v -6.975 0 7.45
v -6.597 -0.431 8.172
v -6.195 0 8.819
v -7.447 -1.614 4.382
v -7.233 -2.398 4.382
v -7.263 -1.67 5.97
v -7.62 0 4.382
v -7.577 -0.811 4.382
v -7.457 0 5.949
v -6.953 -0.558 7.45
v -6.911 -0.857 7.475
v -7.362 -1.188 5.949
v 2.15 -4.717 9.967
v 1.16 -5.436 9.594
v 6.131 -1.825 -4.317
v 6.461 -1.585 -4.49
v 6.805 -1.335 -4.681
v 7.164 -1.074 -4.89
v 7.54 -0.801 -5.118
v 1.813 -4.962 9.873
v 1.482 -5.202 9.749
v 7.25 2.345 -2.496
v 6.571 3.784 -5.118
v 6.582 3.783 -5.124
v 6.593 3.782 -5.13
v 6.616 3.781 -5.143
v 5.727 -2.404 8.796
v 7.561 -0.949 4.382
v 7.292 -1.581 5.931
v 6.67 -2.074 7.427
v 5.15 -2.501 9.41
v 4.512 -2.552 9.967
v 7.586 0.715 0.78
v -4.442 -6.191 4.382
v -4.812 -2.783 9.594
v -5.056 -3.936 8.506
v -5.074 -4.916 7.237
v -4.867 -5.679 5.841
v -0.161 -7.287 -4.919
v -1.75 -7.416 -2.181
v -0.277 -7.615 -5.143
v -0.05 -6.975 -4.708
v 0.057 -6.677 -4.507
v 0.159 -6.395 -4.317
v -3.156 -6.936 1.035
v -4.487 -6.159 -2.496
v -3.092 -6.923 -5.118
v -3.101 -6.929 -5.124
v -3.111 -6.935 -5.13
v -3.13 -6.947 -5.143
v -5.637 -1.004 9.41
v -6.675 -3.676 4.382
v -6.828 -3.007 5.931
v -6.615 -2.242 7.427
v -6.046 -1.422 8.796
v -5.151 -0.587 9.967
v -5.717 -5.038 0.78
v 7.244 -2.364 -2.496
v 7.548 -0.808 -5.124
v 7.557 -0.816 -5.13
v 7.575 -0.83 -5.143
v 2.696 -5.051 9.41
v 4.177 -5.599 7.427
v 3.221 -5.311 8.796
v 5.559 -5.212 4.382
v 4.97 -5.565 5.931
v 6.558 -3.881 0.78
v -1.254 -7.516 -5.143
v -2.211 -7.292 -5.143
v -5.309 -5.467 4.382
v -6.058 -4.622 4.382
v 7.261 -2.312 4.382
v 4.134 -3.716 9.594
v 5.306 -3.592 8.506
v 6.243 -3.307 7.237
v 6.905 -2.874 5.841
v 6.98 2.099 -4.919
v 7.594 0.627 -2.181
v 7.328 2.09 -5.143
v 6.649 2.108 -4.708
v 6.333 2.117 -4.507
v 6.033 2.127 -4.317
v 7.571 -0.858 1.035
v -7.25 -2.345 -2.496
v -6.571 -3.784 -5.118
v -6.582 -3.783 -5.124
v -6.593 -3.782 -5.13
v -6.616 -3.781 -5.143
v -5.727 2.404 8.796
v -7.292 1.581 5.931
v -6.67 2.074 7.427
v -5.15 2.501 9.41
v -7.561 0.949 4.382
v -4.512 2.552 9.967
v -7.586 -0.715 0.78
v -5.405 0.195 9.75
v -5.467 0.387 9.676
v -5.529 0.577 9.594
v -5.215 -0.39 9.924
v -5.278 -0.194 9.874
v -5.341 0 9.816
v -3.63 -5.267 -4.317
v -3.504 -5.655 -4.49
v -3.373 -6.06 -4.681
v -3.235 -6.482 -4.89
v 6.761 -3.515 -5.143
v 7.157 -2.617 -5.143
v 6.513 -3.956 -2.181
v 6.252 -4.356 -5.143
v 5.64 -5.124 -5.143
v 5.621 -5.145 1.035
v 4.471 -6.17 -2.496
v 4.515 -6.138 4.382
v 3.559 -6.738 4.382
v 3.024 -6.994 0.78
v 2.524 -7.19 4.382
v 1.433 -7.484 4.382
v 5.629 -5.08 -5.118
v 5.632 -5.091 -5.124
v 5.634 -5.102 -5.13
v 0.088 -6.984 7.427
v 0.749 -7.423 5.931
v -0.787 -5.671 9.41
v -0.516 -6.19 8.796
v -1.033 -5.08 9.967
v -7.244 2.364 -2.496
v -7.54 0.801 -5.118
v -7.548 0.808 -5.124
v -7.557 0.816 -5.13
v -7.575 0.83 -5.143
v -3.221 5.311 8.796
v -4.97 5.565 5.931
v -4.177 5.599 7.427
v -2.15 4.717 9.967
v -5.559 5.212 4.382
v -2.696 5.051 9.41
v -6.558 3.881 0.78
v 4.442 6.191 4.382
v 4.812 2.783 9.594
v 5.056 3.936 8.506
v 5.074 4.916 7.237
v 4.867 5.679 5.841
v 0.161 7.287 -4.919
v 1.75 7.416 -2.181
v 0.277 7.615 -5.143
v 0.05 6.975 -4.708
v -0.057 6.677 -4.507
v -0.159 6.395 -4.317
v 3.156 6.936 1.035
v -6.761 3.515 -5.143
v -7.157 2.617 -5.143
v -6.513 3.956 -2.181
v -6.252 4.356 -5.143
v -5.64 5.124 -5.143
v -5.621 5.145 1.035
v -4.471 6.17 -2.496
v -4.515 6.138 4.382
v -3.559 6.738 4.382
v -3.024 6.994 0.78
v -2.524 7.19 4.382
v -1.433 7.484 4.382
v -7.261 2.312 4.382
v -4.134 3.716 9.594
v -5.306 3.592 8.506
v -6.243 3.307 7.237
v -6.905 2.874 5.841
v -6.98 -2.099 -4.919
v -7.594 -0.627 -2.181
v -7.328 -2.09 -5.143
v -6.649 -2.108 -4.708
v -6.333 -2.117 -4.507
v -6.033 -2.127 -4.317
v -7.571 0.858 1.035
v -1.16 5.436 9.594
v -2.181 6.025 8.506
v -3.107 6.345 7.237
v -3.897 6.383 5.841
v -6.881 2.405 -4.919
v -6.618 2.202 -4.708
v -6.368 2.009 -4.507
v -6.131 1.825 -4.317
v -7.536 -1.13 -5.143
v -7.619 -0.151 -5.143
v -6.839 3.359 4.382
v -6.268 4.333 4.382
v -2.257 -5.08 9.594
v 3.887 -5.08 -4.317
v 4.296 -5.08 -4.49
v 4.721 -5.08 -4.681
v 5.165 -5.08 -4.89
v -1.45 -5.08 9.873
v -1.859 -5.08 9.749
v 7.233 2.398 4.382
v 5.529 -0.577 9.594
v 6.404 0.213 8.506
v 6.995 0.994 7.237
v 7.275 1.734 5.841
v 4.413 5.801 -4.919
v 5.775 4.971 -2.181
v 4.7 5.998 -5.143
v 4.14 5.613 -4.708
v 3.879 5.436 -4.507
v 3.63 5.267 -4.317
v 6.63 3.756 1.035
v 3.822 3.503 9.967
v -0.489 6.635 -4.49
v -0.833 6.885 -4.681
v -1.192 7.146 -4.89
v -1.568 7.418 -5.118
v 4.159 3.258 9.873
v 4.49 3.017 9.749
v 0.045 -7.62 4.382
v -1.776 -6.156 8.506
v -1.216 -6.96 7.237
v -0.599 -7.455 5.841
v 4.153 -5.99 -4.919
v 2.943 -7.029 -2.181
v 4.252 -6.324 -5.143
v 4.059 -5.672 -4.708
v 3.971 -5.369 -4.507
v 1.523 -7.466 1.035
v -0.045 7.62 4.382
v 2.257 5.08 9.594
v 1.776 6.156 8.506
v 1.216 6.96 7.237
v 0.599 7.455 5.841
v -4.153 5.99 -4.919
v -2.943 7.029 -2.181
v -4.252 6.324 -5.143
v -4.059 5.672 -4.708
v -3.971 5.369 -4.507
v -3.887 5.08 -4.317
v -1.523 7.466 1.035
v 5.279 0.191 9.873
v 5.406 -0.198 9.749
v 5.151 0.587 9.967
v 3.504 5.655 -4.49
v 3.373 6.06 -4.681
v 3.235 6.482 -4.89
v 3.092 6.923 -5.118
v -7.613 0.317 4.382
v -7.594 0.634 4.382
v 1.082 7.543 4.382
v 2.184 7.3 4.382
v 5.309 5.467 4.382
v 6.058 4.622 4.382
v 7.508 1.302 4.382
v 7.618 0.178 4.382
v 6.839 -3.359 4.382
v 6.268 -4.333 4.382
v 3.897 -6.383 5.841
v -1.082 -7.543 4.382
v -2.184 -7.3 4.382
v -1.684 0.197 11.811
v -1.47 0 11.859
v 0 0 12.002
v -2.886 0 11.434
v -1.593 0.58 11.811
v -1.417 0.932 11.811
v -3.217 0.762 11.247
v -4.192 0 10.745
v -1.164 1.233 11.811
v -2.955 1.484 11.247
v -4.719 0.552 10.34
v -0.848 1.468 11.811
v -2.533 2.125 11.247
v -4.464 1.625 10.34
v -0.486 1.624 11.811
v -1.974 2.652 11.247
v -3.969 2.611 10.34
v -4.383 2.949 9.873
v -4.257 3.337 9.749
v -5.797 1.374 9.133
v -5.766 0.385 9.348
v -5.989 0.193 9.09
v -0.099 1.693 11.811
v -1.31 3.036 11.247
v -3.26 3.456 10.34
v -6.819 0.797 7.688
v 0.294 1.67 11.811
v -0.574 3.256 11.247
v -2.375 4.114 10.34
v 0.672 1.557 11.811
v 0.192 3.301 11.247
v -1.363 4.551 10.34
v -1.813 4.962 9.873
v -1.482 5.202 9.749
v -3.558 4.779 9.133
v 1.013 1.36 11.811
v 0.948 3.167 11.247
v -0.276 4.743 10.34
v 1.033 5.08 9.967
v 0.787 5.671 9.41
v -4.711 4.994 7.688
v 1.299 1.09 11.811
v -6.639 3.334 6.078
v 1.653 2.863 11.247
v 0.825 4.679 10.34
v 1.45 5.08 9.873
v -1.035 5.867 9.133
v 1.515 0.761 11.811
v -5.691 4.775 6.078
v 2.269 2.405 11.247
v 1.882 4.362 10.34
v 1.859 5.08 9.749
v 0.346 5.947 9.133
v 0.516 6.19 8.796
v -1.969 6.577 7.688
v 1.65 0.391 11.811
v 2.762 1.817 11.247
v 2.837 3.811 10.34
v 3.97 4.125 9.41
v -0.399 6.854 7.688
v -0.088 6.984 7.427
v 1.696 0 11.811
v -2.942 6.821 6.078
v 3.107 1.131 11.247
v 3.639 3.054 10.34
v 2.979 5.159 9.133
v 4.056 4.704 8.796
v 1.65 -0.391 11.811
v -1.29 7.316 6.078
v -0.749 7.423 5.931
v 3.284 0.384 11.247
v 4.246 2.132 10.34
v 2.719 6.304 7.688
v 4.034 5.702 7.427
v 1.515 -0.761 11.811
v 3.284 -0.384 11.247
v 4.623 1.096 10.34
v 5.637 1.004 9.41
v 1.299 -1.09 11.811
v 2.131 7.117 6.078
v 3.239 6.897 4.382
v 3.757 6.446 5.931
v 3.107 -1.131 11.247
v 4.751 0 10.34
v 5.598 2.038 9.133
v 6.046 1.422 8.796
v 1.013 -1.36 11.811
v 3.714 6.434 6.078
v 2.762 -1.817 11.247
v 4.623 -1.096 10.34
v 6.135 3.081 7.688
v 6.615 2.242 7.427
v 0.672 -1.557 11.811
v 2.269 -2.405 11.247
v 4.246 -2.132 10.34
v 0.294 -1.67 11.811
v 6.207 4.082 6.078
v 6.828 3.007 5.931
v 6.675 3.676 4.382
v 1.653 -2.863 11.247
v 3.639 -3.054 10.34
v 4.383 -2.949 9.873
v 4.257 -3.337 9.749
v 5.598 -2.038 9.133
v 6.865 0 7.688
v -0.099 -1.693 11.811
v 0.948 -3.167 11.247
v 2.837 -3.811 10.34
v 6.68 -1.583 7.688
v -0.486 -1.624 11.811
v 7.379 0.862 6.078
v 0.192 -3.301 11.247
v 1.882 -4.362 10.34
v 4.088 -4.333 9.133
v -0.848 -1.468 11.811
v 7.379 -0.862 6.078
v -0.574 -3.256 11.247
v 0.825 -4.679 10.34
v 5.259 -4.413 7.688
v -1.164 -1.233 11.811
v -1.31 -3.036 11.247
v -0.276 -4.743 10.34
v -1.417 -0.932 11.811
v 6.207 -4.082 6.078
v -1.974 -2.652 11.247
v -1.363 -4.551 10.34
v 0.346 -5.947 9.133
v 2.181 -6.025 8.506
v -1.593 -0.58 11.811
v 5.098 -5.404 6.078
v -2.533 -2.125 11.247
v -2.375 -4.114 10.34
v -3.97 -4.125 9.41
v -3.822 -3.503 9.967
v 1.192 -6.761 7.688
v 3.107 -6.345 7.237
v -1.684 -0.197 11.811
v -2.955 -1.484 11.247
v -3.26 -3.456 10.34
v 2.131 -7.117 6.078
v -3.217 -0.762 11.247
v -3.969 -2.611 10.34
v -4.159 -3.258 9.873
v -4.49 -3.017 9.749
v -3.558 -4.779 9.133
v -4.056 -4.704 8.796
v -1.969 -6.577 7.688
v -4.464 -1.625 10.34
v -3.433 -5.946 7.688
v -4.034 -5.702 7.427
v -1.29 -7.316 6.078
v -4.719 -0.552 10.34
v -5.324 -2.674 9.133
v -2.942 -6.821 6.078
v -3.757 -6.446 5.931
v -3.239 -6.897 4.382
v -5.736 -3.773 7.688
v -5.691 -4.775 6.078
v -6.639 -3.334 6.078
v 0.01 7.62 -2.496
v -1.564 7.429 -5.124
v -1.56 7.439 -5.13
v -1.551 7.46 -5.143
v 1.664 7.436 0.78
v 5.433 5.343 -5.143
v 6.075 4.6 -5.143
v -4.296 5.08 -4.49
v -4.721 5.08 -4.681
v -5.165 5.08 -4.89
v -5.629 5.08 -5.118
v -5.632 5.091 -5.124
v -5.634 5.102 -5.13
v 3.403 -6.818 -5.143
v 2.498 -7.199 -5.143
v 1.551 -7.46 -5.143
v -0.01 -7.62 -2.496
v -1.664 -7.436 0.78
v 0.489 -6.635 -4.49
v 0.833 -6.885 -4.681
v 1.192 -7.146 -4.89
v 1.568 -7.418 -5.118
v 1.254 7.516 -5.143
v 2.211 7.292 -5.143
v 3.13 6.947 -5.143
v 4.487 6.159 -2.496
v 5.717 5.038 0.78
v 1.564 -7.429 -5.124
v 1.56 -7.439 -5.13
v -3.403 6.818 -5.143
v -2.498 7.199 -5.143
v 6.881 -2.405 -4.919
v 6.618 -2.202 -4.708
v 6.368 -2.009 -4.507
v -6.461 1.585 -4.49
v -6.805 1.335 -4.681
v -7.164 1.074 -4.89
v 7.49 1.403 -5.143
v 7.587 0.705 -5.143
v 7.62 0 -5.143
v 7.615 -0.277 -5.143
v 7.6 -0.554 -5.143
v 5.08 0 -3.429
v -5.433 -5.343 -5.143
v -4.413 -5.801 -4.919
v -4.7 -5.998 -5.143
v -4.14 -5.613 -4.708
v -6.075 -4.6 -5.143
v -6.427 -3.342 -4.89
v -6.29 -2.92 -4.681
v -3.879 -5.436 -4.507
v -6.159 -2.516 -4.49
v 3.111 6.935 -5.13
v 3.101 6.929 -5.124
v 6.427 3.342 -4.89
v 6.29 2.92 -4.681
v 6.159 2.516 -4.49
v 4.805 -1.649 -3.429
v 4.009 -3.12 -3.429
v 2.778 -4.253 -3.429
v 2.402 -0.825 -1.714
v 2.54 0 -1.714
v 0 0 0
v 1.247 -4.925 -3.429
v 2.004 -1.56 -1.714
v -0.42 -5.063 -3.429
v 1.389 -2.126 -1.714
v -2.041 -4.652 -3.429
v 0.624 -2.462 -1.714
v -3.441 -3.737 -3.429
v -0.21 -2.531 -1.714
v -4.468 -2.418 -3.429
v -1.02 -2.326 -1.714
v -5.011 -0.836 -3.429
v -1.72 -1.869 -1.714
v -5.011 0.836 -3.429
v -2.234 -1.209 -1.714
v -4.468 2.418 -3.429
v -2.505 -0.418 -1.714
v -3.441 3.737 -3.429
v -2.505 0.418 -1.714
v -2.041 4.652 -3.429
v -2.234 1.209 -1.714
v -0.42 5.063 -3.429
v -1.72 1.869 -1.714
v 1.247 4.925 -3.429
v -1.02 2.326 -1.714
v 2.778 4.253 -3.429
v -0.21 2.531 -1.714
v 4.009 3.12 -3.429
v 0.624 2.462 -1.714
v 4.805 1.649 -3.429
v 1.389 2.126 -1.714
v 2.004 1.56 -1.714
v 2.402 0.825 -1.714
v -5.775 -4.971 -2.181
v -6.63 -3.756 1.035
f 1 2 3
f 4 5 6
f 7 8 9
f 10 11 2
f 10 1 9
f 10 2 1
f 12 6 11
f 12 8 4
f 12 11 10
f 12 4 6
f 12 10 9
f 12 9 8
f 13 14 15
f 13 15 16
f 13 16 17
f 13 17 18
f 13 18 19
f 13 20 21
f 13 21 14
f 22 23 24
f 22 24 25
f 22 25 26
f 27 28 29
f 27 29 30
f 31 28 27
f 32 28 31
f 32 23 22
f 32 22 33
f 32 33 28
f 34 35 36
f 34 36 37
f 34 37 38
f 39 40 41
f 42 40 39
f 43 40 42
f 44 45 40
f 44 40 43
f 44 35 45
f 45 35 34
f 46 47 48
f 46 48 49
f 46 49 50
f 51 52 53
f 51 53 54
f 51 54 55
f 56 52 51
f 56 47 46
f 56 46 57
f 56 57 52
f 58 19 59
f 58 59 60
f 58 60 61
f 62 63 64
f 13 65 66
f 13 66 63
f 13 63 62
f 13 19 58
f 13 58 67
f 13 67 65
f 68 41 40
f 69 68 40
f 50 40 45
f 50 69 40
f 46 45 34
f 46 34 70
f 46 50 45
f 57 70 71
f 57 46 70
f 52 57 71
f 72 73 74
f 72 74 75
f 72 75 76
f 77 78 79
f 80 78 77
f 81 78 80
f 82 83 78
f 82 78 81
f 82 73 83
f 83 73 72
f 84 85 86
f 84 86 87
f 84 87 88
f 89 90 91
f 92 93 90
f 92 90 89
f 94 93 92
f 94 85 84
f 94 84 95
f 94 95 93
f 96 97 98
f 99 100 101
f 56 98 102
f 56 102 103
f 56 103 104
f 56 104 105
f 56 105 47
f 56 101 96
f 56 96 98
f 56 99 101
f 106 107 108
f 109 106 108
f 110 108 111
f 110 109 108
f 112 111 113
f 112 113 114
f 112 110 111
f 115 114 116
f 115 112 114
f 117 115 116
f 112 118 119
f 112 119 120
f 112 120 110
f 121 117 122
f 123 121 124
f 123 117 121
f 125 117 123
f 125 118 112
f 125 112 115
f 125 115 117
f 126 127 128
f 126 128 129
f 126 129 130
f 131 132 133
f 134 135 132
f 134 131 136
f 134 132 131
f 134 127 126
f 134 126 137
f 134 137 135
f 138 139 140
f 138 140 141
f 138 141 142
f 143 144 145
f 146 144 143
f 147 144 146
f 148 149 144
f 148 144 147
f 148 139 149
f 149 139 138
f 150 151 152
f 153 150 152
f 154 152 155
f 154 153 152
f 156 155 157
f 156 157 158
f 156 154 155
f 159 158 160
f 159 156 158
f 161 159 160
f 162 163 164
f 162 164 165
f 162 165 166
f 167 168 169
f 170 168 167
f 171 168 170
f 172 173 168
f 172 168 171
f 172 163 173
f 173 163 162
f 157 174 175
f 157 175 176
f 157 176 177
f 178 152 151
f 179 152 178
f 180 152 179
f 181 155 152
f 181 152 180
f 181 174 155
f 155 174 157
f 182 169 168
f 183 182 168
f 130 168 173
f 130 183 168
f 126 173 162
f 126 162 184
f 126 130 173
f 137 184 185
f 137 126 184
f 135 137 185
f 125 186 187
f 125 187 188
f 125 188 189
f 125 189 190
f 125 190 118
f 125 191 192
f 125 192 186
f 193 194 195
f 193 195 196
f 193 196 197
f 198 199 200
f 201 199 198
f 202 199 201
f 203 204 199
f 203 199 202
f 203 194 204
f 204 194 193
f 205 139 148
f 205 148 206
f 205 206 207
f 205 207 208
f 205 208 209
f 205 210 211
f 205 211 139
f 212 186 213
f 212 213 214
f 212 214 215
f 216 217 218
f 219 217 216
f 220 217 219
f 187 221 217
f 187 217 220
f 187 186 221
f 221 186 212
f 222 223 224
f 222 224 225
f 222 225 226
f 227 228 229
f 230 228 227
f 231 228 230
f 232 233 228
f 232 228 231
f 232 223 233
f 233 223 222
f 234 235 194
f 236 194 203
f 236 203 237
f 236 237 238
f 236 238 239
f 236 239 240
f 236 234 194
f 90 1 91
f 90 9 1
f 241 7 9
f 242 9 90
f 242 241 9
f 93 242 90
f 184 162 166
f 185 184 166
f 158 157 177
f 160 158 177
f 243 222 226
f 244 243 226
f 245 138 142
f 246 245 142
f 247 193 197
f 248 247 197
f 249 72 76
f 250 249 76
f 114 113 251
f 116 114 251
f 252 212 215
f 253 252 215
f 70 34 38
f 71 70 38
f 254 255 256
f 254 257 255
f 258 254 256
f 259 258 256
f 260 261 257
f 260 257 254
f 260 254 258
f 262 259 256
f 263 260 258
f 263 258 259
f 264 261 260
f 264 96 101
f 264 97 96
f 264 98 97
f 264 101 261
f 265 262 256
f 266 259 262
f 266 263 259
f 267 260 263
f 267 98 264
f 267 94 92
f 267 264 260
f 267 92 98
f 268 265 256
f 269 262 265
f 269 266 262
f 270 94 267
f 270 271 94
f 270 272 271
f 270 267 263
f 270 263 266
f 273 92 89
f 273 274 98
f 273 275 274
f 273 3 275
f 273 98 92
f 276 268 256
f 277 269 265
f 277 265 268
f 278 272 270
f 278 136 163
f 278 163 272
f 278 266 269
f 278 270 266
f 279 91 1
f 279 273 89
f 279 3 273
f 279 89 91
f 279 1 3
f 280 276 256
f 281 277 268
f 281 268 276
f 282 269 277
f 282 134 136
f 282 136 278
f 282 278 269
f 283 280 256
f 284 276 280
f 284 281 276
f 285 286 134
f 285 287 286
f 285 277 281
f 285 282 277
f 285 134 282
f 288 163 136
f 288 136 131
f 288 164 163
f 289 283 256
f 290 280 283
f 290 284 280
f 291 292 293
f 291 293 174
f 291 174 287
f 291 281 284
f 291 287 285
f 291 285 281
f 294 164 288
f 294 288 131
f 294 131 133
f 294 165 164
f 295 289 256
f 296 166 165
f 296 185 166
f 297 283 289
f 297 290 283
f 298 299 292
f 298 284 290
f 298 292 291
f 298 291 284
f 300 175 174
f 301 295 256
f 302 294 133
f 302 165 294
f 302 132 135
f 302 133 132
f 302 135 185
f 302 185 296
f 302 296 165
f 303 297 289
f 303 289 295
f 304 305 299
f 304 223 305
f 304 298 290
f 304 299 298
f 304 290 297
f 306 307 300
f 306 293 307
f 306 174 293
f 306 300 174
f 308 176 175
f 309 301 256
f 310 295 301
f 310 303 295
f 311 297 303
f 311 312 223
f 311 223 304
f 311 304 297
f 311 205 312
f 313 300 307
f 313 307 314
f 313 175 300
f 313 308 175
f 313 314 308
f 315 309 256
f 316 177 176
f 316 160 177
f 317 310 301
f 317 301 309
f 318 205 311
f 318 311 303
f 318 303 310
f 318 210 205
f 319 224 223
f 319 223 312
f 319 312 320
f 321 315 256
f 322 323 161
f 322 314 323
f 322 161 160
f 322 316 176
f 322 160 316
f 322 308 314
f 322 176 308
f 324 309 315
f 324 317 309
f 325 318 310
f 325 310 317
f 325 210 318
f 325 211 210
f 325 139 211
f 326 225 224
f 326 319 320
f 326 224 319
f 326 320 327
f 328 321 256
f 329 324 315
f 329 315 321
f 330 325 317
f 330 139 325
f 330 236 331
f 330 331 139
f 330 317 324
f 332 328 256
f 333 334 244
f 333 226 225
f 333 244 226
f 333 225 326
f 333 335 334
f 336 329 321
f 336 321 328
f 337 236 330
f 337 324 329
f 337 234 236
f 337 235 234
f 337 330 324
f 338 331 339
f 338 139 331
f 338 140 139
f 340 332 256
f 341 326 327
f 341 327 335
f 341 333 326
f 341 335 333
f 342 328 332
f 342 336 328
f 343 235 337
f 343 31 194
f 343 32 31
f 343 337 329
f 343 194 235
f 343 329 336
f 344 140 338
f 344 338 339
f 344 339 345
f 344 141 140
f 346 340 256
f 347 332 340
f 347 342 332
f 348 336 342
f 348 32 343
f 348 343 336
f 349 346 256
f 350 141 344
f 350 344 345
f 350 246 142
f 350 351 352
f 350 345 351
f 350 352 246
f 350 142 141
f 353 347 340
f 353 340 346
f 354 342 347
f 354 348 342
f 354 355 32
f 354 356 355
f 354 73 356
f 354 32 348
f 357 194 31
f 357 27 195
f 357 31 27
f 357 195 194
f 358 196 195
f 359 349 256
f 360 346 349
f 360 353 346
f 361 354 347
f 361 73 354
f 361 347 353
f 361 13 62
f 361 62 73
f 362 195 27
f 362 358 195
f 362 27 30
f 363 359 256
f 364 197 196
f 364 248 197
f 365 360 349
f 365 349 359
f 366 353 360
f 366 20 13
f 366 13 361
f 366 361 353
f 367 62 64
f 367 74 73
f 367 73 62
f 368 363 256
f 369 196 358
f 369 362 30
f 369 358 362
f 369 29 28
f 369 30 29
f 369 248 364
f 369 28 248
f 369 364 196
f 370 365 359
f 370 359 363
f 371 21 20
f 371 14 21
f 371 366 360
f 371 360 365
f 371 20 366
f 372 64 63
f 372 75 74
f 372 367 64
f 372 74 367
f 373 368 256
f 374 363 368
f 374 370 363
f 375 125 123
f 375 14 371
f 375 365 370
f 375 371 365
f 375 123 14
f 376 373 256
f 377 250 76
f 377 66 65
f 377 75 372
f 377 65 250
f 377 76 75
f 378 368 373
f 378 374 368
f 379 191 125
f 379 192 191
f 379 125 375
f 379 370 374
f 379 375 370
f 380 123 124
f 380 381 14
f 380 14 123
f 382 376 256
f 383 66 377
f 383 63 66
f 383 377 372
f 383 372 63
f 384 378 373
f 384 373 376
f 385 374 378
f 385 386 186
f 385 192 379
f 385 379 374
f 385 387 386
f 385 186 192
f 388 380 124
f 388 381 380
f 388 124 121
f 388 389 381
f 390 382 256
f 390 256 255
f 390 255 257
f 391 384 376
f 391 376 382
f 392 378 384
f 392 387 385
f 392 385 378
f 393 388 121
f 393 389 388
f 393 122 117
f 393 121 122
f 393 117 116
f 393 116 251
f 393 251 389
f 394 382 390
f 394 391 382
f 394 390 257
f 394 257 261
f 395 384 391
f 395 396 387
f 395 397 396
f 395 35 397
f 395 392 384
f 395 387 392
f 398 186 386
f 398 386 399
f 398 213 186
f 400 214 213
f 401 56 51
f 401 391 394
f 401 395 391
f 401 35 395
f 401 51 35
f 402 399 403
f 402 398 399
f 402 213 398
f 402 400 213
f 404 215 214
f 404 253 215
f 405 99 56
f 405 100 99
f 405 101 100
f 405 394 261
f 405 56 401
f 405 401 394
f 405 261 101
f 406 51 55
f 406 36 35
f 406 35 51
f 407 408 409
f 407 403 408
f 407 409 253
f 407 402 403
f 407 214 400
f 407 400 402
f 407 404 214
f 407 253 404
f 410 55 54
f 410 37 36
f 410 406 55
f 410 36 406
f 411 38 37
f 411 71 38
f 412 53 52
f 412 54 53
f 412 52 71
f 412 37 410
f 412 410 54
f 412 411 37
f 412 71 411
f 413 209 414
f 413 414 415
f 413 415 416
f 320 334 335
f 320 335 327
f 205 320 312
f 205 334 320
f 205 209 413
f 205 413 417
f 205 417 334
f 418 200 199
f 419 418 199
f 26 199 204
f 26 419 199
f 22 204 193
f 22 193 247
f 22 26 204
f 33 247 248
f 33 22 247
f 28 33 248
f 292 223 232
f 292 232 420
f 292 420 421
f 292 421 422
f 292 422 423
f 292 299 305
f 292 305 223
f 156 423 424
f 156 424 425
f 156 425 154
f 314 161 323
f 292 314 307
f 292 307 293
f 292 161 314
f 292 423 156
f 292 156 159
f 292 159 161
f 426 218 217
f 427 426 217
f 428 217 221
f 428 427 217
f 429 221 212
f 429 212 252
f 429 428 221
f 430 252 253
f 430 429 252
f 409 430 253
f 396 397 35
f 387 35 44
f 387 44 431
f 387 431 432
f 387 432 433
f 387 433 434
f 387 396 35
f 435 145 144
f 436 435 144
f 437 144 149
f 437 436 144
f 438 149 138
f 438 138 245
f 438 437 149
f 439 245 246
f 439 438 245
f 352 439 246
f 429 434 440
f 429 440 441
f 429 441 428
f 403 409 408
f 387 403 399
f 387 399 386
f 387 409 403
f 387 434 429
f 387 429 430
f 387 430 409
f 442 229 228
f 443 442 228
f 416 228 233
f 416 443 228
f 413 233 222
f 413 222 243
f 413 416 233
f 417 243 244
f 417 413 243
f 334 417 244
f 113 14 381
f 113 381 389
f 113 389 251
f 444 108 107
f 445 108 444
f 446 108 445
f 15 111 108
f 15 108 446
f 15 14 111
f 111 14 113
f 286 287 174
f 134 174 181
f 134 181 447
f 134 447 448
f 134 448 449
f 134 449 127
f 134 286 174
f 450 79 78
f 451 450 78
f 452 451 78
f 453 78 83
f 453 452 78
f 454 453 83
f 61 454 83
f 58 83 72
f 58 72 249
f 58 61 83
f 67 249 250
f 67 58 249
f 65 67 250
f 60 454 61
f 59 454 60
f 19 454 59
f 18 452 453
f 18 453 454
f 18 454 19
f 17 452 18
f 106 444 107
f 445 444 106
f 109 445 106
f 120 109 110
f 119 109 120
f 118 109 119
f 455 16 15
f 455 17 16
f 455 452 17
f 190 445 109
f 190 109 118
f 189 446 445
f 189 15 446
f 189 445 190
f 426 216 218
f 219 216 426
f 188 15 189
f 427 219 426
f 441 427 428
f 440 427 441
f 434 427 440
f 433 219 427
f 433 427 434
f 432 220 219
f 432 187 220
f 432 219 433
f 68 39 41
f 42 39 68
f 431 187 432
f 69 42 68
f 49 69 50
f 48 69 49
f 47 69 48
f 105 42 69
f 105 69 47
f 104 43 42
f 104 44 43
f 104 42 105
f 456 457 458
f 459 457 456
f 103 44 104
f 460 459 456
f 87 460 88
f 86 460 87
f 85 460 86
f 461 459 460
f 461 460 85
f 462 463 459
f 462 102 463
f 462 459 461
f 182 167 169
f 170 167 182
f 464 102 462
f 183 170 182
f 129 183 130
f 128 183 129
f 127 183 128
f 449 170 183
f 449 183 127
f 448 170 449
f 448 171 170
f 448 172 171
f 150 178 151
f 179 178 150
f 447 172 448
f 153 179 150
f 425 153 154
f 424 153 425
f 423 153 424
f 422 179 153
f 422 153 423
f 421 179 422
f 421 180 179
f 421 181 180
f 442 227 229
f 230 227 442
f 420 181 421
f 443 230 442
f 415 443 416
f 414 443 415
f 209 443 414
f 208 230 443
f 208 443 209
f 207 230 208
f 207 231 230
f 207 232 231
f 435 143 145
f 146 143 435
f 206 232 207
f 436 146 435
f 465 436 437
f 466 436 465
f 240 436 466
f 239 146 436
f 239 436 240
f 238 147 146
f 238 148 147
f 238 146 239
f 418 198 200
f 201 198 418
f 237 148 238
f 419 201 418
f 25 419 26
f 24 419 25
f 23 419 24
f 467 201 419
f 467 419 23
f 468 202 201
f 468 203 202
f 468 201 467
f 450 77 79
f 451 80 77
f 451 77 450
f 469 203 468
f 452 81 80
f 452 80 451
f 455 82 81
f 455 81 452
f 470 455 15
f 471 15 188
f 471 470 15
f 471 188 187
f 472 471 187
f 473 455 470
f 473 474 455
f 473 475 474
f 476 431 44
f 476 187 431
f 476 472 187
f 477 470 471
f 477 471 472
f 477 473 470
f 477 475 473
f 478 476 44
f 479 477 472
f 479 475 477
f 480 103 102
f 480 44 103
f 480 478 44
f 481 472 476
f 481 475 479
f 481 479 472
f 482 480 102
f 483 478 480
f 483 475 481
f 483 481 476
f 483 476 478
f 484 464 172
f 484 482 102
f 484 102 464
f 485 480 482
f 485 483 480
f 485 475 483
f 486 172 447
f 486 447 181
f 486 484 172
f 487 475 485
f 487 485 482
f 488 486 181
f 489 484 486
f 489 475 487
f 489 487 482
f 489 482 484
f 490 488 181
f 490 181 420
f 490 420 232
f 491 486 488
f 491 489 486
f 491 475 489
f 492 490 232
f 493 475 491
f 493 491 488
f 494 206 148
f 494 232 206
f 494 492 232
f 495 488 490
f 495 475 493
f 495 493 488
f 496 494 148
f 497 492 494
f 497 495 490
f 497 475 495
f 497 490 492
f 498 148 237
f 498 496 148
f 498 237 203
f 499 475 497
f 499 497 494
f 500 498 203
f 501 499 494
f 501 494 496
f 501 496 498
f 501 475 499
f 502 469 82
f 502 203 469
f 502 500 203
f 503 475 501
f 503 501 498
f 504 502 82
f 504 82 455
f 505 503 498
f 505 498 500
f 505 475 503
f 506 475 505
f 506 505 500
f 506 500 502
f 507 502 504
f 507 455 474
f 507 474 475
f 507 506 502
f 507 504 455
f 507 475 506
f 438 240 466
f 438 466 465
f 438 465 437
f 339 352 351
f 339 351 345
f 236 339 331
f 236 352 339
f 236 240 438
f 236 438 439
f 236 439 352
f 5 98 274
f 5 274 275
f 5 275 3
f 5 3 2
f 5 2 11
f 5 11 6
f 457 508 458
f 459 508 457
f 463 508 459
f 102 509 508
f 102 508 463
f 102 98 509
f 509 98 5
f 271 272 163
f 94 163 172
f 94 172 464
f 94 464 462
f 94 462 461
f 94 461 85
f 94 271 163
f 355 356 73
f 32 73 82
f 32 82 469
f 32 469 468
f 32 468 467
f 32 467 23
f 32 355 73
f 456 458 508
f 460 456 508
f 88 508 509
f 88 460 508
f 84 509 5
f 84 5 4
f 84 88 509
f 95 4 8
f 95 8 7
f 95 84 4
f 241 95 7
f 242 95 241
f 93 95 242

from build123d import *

# Parameters (mm, degrees)
F1_FACE_R       = 7.62
F5_DEPTH        = 25.4
F5_COPIES_COUNT = 10


# Not quite as in the source:
# - a pattern or mirror of a feature is missing from the dataset's text; its kind, count and spacing are read off the source's solid


with BuildPart() as f1:
    # F0 (on Front) → F1 (revolve)
    with BuildSketch(Plane.XZ):
        with BuildLine():
            Line((-7.62, 4.3819724477), (-7.62, -5.1430275523))
            Line((-7.62, -5.1430275523), (0, -5.1430275523))
            Line((0, -5.1430275523), (0, 12.0019724477))
            ThreePointArc((0, 12.0019724477), (-5.3881536726, 9.7701261203), (-7.62, 4.3819724477))
        make_face()
    revolve(axis=Axis((0, 0, 3.4294724477), (0, 0, -1)))

    # F1_face (on face) → F2 section 0
    with BuildSketch(Plane(origin=(0, 0, -5.1430275523), x_dir=(1, 0, 0), z_dir=(0, 0, -1)), mode=Mode.PRIVATE) as f2_s0:
        Circle(F1_FACE_R)
    loft([f2_s0.sketch, Vertex(0, 0, 0)], mode=Mode.SUBTRACT)

    # F4 (on offset) → F5 (cut)
    with BuildSketch(Plane.XZ.offset(5.08)):
        Polygon((6.7222419615, -10.7367794649), (7.8839848078, -10.2236970553), (-11.1258903258, 32.8192645344), (-12.2876331722, 32.3061821249), align=None)
    f5 = extrude(amount=F5_DEPTH, mode=Mode.SUBTRACT)

    # F5_copies: F5 ×10 about axis
    f5_copies_axis = Axis((0, 0, 0), (0, 0, 1))
    for i in range(1, F5_COPIES_COUNT):
        add(f5.rotate(f5_copies_axis, i * 360 / F5_COPIES_COUNT), mode=Mode.SUBTRACT)


solid = f1.part
